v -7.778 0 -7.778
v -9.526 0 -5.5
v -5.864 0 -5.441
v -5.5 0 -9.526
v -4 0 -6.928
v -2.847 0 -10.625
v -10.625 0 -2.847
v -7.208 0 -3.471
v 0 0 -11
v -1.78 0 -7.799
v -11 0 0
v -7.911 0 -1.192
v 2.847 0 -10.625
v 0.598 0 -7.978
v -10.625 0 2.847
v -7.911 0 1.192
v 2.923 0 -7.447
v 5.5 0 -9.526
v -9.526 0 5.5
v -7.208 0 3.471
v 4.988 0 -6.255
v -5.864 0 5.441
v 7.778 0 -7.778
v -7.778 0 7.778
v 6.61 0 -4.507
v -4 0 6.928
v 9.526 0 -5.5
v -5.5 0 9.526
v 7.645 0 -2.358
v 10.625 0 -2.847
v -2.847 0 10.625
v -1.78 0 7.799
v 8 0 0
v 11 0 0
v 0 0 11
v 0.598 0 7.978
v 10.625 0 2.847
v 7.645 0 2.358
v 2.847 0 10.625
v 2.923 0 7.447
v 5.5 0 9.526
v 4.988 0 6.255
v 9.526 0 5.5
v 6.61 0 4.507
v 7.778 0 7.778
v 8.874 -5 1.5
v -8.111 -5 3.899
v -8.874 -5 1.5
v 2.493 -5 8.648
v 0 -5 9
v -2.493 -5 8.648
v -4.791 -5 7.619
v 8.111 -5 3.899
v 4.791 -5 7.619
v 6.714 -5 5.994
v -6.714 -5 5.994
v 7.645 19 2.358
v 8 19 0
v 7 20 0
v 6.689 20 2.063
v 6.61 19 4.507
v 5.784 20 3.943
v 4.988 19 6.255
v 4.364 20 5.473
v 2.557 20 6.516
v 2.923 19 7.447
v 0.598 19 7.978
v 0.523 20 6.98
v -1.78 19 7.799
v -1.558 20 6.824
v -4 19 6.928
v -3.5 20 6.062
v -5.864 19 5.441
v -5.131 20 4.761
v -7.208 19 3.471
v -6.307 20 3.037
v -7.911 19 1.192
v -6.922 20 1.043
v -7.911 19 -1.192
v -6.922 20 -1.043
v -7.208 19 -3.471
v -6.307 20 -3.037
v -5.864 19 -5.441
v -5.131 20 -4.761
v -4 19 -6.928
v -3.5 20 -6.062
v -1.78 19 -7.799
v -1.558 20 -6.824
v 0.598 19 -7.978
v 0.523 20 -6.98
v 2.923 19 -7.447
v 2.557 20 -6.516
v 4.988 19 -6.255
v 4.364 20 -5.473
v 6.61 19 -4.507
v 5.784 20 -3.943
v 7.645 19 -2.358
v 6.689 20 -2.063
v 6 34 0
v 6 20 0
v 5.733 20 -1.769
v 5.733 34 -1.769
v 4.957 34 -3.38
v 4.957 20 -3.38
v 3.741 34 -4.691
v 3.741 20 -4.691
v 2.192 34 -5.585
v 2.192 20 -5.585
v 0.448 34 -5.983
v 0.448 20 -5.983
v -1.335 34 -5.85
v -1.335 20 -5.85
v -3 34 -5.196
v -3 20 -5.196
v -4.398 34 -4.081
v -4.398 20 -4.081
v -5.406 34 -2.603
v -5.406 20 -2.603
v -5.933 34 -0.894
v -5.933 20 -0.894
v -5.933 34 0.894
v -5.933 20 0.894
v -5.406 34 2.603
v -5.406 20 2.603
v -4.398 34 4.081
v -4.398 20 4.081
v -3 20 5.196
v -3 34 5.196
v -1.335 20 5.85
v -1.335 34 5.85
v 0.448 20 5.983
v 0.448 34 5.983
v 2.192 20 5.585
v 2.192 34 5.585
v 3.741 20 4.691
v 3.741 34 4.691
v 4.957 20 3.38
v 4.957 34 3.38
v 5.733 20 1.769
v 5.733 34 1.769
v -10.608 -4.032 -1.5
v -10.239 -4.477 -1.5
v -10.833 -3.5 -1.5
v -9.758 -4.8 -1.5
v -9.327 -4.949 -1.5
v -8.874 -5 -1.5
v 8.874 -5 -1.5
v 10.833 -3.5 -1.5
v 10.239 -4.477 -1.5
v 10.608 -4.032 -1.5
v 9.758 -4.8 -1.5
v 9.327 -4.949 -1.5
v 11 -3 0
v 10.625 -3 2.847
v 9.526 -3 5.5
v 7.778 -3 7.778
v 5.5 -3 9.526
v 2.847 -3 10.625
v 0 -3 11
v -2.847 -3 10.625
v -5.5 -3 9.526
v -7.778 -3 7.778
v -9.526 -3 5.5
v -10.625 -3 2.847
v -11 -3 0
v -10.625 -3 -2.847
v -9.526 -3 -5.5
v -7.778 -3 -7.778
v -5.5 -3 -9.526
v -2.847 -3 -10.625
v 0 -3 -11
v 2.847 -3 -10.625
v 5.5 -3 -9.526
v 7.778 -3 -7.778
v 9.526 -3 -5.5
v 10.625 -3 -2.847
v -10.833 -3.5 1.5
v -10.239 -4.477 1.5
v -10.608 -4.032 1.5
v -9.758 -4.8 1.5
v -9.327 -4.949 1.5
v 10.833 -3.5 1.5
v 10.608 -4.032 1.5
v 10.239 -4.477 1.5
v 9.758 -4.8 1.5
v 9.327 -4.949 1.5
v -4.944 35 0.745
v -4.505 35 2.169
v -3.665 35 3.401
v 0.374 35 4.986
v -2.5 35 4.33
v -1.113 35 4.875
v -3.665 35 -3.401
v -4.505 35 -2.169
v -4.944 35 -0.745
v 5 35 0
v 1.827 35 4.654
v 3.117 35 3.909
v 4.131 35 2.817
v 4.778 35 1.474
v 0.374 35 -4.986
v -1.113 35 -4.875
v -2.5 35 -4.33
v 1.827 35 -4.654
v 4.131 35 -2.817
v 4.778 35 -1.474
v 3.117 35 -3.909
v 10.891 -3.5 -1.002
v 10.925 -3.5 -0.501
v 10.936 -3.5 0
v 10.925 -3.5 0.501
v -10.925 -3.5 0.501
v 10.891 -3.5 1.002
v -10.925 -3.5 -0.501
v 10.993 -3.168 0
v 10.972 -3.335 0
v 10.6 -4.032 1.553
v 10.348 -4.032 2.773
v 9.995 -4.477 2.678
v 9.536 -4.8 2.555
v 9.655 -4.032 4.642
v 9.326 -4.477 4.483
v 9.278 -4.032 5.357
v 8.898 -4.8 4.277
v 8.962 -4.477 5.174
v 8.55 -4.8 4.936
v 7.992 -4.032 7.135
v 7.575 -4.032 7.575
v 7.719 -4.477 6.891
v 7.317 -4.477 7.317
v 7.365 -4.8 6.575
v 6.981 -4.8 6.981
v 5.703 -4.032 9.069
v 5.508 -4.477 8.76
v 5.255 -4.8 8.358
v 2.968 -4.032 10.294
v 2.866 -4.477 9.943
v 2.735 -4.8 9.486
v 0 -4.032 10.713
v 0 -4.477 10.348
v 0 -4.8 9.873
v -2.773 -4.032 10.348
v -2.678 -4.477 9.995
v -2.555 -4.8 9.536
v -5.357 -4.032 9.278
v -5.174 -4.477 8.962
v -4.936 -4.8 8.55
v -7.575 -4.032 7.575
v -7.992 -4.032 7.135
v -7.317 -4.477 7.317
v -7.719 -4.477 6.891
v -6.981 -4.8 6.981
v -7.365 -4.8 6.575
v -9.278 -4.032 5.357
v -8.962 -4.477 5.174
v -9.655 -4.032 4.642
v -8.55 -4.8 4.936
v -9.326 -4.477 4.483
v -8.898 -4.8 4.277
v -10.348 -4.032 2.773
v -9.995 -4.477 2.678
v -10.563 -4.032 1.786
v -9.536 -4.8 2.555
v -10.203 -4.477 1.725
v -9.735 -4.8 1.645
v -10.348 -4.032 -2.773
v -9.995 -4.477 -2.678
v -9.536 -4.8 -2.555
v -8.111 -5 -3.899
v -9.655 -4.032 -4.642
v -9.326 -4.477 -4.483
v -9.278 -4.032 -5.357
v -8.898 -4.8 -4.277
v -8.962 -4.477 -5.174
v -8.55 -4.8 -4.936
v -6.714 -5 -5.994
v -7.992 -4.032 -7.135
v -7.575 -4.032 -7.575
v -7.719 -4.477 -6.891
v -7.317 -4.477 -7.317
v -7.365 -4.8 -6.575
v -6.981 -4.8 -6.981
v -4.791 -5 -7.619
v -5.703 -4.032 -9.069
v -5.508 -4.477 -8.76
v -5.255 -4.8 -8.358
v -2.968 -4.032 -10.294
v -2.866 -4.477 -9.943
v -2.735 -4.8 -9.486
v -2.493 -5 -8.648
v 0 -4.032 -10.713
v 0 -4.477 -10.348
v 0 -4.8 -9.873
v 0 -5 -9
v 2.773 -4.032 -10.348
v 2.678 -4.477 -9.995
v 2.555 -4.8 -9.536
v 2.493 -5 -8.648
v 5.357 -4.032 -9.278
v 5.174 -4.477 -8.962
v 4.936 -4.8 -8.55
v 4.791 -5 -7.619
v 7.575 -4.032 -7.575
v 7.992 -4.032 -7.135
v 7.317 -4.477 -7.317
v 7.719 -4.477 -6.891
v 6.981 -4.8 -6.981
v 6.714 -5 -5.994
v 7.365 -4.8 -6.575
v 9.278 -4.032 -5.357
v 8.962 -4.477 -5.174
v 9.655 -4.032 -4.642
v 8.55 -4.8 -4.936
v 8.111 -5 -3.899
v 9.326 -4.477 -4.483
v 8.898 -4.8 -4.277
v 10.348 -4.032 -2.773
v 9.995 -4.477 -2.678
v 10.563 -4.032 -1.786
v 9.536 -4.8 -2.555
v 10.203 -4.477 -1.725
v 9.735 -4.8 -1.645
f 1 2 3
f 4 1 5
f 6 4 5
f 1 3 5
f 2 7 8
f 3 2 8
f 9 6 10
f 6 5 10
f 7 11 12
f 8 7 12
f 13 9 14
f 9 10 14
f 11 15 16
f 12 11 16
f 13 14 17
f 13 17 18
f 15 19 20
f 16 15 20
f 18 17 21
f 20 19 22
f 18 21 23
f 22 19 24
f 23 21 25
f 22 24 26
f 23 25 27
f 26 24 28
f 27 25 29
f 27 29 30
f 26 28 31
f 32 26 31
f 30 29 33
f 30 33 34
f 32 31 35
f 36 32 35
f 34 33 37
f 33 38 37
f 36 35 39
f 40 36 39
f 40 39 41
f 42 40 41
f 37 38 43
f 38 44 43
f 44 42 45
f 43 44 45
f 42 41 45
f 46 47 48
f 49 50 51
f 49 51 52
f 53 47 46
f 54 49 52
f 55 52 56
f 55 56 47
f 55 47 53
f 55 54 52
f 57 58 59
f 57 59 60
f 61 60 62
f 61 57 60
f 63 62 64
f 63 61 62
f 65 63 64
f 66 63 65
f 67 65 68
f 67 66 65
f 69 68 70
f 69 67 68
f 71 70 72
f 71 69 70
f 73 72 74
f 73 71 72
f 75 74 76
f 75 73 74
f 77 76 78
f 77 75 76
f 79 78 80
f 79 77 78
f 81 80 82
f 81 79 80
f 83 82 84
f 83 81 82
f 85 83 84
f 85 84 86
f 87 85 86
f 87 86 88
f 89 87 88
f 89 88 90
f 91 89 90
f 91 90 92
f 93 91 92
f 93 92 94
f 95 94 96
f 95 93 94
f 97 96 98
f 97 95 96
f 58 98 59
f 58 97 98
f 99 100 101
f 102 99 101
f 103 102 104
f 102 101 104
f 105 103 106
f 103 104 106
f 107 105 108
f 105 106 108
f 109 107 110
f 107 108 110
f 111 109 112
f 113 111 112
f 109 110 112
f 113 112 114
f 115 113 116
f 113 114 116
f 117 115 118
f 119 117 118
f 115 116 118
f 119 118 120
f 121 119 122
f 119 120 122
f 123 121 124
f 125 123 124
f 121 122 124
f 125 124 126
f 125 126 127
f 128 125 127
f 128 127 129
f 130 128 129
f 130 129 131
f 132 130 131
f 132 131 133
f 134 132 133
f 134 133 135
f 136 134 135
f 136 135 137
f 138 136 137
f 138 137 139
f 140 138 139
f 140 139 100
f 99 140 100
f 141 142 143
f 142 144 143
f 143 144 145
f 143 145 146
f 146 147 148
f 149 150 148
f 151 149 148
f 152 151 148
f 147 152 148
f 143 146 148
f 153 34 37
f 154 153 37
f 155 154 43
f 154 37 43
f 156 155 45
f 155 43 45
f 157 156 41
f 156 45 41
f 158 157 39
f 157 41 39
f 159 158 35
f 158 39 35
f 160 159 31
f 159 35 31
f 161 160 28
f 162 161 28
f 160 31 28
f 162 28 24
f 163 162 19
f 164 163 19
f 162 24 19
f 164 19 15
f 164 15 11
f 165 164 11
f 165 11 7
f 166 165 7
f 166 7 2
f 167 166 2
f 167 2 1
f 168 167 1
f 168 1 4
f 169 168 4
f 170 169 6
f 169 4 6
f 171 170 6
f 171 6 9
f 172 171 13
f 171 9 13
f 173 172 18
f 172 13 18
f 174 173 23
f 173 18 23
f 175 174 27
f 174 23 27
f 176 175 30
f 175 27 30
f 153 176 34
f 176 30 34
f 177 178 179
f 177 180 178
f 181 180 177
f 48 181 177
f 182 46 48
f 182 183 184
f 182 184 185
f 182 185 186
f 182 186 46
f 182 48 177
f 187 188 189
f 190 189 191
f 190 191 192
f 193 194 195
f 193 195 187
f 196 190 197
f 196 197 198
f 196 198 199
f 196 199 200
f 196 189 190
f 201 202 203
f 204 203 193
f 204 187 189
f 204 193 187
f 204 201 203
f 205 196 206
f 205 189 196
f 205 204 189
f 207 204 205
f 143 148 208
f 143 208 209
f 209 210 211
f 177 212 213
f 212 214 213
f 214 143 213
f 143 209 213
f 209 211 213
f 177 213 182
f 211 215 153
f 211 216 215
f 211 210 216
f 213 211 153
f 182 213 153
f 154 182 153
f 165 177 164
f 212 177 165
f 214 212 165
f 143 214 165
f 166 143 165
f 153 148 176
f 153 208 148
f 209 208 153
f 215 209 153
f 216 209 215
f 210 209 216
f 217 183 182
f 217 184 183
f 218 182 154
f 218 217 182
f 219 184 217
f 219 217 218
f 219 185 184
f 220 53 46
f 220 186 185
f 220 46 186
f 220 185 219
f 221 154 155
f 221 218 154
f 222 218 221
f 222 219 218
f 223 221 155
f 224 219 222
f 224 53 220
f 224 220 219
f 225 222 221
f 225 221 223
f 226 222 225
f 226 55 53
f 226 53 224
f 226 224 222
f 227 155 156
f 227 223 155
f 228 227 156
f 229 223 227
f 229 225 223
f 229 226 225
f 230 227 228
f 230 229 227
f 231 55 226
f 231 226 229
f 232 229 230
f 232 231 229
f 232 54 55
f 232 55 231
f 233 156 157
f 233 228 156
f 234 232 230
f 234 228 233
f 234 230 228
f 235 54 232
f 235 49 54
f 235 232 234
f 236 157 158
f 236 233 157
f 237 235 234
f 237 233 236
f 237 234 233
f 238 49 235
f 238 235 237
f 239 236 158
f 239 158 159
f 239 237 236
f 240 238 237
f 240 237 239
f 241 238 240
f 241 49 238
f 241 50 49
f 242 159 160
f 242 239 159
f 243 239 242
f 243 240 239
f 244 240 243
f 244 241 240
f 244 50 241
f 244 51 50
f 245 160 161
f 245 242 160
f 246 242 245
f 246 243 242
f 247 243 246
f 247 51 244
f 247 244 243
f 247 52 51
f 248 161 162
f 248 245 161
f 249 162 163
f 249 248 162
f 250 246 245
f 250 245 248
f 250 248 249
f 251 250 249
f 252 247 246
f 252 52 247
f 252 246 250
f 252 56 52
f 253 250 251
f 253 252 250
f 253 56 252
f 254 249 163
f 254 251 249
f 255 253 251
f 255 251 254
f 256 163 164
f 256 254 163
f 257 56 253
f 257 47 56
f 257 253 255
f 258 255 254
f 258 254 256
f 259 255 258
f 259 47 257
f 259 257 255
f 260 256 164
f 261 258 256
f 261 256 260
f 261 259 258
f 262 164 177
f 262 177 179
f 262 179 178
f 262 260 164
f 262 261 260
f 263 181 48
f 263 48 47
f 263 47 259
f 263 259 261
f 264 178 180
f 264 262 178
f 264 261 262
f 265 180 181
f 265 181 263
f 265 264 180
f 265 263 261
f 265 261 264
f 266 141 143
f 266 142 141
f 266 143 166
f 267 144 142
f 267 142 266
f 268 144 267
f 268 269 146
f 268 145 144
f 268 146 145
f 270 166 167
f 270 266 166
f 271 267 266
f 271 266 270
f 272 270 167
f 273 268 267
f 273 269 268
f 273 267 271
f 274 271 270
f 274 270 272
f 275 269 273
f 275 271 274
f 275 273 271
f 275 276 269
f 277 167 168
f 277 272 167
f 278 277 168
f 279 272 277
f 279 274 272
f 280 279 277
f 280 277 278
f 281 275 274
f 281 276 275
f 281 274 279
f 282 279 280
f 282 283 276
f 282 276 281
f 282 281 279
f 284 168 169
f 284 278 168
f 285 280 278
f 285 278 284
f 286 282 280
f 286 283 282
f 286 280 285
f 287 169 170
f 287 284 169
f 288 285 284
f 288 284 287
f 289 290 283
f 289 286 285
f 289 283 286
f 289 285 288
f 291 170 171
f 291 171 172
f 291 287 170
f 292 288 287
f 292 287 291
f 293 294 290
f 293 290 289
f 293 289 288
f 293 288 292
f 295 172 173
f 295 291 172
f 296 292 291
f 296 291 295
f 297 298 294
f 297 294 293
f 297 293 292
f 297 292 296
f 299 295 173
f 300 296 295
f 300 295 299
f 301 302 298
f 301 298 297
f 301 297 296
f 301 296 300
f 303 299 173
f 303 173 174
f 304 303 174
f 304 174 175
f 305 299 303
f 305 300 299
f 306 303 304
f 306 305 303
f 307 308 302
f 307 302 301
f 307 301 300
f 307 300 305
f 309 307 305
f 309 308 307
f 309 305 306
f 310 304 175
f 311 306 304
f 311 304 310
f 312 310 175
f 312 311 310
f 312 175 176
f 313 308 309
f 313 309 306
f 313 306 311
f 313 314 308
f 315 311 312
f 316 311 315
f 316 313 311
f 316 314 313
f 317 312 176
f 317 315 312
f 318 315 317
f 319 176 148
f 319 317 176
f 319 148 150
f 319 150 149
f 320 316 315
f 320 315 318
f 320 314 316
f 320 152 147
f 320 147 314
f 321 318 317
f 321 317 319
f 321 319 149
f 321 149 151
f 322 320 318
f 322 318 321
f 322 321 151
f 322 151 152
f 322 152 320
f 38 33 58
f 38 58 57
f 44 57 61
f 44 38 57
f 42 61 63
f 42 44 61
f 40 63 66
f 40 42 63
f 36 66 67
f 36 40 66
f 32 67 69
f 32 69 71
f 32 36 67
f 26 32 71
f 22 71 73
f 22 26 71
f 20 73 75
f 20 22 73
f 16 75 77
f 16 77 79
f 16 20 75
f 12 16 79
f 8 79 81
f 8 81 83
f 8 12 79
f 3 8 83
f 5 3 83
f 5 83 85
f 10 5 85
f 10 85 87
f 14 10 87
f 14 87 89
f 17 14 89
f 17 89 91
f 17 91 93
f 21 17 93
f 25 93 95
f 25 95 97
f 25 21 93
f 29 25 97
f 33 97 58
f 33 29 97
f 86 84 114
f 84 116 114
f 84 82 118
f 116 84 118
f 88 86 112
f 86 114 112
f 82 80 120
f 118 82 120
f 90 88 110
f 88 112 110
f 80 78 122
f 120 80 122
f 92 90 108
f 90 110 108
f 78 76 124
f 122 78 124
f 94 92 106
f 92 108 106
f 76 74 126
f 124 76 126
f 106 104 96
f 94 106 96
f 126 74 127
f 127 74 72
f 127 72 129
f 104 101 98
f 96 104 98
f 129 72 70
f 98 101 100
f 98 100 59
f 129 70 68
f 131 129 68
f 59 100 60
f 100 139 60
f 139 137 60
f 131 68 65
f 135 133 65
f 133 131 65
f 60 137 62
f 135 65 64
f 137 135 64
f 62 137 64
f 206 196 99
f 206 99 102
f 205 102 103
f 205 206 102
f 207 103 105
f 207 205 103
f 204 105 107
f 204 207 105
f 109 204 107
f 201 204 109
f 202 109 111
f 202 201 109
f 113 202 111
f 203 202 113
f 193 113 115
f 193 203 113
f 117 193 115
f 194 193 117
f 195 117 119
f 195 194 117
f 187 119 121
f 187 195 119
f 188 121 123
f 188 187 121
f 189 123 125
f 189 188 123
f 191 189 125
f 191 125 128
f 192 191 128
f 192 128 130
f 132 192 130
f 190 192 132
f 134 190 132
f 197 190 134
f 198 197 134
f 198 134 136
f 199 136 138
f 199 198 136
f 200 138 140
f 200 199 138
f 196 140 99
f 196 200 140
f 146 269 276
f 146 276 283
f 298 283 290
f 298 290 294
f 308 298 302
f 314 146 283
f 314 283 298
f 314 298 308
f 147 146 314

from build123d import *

# Parameters (mm, degrees)
F0_R      = 11
F1_DEPTH  = 5
F2_R      = 2
F3_R      = 8
F3_R_2    = 6
F4_DEPTH  = 20
F4_FACE_R = 6
F5_DEPTH  = 35
F6_SIZE2  = 1
F6_SIZE   = 1
F7_W      = 1.5
F7_H      = 3
F8_DEPTH  = 12.5


with BuildPart() as f1:
    # F0 (on Front) → F1 (new body)
    with BuildSketch(Plane.XZ):
        Circle(F0_R)
    extrude(amount=F1_DEPTH)

    # F2
    f2_edges = [f1.edges().sort_by_distance(p)[0] for p in [
        (-11, -5, 0),
    ]]
    fillet(f2_edges, radius=F2_R)

    # F3 (on Front) → F4 (join)
    with BuildSketch(Plane.XZ):
        Circle(F3_R)
        Circle(F3_R_2, mode=Mode.SUBTRACT)
    extrude(amount=-F4_DEPTH)

    # F4_face (on face) → F5 (join)
    with BuildSketch(Plane(origin=(0, 0, 0), x_dir=(1, 0, 0), z_dir=(0, 1, 0))):
        Circle(F4_FACE_R)
    extrude(amount=F5_DEPTH)

    # F6
    f6_edges = [f1.edges().sort_by_distance(p)[0] for p in [
        (-6, 35, 0),
        (-8, 20, 0),
    ]]
    chamfer(f6_edges, length=F6_SIZE, length2=F6_SIZE2)

    # F7 (on Right) → F8 (cut, symmetric)
    with BuildSketch(Plane.YZ):
        with Locations((-4.25, 0)):
            Rectangle(F7_W, F7_H)
    extrude(amount=F8_DEPTH, both=True, mode=Mode.SUBTRACT)


solid = f1.part
